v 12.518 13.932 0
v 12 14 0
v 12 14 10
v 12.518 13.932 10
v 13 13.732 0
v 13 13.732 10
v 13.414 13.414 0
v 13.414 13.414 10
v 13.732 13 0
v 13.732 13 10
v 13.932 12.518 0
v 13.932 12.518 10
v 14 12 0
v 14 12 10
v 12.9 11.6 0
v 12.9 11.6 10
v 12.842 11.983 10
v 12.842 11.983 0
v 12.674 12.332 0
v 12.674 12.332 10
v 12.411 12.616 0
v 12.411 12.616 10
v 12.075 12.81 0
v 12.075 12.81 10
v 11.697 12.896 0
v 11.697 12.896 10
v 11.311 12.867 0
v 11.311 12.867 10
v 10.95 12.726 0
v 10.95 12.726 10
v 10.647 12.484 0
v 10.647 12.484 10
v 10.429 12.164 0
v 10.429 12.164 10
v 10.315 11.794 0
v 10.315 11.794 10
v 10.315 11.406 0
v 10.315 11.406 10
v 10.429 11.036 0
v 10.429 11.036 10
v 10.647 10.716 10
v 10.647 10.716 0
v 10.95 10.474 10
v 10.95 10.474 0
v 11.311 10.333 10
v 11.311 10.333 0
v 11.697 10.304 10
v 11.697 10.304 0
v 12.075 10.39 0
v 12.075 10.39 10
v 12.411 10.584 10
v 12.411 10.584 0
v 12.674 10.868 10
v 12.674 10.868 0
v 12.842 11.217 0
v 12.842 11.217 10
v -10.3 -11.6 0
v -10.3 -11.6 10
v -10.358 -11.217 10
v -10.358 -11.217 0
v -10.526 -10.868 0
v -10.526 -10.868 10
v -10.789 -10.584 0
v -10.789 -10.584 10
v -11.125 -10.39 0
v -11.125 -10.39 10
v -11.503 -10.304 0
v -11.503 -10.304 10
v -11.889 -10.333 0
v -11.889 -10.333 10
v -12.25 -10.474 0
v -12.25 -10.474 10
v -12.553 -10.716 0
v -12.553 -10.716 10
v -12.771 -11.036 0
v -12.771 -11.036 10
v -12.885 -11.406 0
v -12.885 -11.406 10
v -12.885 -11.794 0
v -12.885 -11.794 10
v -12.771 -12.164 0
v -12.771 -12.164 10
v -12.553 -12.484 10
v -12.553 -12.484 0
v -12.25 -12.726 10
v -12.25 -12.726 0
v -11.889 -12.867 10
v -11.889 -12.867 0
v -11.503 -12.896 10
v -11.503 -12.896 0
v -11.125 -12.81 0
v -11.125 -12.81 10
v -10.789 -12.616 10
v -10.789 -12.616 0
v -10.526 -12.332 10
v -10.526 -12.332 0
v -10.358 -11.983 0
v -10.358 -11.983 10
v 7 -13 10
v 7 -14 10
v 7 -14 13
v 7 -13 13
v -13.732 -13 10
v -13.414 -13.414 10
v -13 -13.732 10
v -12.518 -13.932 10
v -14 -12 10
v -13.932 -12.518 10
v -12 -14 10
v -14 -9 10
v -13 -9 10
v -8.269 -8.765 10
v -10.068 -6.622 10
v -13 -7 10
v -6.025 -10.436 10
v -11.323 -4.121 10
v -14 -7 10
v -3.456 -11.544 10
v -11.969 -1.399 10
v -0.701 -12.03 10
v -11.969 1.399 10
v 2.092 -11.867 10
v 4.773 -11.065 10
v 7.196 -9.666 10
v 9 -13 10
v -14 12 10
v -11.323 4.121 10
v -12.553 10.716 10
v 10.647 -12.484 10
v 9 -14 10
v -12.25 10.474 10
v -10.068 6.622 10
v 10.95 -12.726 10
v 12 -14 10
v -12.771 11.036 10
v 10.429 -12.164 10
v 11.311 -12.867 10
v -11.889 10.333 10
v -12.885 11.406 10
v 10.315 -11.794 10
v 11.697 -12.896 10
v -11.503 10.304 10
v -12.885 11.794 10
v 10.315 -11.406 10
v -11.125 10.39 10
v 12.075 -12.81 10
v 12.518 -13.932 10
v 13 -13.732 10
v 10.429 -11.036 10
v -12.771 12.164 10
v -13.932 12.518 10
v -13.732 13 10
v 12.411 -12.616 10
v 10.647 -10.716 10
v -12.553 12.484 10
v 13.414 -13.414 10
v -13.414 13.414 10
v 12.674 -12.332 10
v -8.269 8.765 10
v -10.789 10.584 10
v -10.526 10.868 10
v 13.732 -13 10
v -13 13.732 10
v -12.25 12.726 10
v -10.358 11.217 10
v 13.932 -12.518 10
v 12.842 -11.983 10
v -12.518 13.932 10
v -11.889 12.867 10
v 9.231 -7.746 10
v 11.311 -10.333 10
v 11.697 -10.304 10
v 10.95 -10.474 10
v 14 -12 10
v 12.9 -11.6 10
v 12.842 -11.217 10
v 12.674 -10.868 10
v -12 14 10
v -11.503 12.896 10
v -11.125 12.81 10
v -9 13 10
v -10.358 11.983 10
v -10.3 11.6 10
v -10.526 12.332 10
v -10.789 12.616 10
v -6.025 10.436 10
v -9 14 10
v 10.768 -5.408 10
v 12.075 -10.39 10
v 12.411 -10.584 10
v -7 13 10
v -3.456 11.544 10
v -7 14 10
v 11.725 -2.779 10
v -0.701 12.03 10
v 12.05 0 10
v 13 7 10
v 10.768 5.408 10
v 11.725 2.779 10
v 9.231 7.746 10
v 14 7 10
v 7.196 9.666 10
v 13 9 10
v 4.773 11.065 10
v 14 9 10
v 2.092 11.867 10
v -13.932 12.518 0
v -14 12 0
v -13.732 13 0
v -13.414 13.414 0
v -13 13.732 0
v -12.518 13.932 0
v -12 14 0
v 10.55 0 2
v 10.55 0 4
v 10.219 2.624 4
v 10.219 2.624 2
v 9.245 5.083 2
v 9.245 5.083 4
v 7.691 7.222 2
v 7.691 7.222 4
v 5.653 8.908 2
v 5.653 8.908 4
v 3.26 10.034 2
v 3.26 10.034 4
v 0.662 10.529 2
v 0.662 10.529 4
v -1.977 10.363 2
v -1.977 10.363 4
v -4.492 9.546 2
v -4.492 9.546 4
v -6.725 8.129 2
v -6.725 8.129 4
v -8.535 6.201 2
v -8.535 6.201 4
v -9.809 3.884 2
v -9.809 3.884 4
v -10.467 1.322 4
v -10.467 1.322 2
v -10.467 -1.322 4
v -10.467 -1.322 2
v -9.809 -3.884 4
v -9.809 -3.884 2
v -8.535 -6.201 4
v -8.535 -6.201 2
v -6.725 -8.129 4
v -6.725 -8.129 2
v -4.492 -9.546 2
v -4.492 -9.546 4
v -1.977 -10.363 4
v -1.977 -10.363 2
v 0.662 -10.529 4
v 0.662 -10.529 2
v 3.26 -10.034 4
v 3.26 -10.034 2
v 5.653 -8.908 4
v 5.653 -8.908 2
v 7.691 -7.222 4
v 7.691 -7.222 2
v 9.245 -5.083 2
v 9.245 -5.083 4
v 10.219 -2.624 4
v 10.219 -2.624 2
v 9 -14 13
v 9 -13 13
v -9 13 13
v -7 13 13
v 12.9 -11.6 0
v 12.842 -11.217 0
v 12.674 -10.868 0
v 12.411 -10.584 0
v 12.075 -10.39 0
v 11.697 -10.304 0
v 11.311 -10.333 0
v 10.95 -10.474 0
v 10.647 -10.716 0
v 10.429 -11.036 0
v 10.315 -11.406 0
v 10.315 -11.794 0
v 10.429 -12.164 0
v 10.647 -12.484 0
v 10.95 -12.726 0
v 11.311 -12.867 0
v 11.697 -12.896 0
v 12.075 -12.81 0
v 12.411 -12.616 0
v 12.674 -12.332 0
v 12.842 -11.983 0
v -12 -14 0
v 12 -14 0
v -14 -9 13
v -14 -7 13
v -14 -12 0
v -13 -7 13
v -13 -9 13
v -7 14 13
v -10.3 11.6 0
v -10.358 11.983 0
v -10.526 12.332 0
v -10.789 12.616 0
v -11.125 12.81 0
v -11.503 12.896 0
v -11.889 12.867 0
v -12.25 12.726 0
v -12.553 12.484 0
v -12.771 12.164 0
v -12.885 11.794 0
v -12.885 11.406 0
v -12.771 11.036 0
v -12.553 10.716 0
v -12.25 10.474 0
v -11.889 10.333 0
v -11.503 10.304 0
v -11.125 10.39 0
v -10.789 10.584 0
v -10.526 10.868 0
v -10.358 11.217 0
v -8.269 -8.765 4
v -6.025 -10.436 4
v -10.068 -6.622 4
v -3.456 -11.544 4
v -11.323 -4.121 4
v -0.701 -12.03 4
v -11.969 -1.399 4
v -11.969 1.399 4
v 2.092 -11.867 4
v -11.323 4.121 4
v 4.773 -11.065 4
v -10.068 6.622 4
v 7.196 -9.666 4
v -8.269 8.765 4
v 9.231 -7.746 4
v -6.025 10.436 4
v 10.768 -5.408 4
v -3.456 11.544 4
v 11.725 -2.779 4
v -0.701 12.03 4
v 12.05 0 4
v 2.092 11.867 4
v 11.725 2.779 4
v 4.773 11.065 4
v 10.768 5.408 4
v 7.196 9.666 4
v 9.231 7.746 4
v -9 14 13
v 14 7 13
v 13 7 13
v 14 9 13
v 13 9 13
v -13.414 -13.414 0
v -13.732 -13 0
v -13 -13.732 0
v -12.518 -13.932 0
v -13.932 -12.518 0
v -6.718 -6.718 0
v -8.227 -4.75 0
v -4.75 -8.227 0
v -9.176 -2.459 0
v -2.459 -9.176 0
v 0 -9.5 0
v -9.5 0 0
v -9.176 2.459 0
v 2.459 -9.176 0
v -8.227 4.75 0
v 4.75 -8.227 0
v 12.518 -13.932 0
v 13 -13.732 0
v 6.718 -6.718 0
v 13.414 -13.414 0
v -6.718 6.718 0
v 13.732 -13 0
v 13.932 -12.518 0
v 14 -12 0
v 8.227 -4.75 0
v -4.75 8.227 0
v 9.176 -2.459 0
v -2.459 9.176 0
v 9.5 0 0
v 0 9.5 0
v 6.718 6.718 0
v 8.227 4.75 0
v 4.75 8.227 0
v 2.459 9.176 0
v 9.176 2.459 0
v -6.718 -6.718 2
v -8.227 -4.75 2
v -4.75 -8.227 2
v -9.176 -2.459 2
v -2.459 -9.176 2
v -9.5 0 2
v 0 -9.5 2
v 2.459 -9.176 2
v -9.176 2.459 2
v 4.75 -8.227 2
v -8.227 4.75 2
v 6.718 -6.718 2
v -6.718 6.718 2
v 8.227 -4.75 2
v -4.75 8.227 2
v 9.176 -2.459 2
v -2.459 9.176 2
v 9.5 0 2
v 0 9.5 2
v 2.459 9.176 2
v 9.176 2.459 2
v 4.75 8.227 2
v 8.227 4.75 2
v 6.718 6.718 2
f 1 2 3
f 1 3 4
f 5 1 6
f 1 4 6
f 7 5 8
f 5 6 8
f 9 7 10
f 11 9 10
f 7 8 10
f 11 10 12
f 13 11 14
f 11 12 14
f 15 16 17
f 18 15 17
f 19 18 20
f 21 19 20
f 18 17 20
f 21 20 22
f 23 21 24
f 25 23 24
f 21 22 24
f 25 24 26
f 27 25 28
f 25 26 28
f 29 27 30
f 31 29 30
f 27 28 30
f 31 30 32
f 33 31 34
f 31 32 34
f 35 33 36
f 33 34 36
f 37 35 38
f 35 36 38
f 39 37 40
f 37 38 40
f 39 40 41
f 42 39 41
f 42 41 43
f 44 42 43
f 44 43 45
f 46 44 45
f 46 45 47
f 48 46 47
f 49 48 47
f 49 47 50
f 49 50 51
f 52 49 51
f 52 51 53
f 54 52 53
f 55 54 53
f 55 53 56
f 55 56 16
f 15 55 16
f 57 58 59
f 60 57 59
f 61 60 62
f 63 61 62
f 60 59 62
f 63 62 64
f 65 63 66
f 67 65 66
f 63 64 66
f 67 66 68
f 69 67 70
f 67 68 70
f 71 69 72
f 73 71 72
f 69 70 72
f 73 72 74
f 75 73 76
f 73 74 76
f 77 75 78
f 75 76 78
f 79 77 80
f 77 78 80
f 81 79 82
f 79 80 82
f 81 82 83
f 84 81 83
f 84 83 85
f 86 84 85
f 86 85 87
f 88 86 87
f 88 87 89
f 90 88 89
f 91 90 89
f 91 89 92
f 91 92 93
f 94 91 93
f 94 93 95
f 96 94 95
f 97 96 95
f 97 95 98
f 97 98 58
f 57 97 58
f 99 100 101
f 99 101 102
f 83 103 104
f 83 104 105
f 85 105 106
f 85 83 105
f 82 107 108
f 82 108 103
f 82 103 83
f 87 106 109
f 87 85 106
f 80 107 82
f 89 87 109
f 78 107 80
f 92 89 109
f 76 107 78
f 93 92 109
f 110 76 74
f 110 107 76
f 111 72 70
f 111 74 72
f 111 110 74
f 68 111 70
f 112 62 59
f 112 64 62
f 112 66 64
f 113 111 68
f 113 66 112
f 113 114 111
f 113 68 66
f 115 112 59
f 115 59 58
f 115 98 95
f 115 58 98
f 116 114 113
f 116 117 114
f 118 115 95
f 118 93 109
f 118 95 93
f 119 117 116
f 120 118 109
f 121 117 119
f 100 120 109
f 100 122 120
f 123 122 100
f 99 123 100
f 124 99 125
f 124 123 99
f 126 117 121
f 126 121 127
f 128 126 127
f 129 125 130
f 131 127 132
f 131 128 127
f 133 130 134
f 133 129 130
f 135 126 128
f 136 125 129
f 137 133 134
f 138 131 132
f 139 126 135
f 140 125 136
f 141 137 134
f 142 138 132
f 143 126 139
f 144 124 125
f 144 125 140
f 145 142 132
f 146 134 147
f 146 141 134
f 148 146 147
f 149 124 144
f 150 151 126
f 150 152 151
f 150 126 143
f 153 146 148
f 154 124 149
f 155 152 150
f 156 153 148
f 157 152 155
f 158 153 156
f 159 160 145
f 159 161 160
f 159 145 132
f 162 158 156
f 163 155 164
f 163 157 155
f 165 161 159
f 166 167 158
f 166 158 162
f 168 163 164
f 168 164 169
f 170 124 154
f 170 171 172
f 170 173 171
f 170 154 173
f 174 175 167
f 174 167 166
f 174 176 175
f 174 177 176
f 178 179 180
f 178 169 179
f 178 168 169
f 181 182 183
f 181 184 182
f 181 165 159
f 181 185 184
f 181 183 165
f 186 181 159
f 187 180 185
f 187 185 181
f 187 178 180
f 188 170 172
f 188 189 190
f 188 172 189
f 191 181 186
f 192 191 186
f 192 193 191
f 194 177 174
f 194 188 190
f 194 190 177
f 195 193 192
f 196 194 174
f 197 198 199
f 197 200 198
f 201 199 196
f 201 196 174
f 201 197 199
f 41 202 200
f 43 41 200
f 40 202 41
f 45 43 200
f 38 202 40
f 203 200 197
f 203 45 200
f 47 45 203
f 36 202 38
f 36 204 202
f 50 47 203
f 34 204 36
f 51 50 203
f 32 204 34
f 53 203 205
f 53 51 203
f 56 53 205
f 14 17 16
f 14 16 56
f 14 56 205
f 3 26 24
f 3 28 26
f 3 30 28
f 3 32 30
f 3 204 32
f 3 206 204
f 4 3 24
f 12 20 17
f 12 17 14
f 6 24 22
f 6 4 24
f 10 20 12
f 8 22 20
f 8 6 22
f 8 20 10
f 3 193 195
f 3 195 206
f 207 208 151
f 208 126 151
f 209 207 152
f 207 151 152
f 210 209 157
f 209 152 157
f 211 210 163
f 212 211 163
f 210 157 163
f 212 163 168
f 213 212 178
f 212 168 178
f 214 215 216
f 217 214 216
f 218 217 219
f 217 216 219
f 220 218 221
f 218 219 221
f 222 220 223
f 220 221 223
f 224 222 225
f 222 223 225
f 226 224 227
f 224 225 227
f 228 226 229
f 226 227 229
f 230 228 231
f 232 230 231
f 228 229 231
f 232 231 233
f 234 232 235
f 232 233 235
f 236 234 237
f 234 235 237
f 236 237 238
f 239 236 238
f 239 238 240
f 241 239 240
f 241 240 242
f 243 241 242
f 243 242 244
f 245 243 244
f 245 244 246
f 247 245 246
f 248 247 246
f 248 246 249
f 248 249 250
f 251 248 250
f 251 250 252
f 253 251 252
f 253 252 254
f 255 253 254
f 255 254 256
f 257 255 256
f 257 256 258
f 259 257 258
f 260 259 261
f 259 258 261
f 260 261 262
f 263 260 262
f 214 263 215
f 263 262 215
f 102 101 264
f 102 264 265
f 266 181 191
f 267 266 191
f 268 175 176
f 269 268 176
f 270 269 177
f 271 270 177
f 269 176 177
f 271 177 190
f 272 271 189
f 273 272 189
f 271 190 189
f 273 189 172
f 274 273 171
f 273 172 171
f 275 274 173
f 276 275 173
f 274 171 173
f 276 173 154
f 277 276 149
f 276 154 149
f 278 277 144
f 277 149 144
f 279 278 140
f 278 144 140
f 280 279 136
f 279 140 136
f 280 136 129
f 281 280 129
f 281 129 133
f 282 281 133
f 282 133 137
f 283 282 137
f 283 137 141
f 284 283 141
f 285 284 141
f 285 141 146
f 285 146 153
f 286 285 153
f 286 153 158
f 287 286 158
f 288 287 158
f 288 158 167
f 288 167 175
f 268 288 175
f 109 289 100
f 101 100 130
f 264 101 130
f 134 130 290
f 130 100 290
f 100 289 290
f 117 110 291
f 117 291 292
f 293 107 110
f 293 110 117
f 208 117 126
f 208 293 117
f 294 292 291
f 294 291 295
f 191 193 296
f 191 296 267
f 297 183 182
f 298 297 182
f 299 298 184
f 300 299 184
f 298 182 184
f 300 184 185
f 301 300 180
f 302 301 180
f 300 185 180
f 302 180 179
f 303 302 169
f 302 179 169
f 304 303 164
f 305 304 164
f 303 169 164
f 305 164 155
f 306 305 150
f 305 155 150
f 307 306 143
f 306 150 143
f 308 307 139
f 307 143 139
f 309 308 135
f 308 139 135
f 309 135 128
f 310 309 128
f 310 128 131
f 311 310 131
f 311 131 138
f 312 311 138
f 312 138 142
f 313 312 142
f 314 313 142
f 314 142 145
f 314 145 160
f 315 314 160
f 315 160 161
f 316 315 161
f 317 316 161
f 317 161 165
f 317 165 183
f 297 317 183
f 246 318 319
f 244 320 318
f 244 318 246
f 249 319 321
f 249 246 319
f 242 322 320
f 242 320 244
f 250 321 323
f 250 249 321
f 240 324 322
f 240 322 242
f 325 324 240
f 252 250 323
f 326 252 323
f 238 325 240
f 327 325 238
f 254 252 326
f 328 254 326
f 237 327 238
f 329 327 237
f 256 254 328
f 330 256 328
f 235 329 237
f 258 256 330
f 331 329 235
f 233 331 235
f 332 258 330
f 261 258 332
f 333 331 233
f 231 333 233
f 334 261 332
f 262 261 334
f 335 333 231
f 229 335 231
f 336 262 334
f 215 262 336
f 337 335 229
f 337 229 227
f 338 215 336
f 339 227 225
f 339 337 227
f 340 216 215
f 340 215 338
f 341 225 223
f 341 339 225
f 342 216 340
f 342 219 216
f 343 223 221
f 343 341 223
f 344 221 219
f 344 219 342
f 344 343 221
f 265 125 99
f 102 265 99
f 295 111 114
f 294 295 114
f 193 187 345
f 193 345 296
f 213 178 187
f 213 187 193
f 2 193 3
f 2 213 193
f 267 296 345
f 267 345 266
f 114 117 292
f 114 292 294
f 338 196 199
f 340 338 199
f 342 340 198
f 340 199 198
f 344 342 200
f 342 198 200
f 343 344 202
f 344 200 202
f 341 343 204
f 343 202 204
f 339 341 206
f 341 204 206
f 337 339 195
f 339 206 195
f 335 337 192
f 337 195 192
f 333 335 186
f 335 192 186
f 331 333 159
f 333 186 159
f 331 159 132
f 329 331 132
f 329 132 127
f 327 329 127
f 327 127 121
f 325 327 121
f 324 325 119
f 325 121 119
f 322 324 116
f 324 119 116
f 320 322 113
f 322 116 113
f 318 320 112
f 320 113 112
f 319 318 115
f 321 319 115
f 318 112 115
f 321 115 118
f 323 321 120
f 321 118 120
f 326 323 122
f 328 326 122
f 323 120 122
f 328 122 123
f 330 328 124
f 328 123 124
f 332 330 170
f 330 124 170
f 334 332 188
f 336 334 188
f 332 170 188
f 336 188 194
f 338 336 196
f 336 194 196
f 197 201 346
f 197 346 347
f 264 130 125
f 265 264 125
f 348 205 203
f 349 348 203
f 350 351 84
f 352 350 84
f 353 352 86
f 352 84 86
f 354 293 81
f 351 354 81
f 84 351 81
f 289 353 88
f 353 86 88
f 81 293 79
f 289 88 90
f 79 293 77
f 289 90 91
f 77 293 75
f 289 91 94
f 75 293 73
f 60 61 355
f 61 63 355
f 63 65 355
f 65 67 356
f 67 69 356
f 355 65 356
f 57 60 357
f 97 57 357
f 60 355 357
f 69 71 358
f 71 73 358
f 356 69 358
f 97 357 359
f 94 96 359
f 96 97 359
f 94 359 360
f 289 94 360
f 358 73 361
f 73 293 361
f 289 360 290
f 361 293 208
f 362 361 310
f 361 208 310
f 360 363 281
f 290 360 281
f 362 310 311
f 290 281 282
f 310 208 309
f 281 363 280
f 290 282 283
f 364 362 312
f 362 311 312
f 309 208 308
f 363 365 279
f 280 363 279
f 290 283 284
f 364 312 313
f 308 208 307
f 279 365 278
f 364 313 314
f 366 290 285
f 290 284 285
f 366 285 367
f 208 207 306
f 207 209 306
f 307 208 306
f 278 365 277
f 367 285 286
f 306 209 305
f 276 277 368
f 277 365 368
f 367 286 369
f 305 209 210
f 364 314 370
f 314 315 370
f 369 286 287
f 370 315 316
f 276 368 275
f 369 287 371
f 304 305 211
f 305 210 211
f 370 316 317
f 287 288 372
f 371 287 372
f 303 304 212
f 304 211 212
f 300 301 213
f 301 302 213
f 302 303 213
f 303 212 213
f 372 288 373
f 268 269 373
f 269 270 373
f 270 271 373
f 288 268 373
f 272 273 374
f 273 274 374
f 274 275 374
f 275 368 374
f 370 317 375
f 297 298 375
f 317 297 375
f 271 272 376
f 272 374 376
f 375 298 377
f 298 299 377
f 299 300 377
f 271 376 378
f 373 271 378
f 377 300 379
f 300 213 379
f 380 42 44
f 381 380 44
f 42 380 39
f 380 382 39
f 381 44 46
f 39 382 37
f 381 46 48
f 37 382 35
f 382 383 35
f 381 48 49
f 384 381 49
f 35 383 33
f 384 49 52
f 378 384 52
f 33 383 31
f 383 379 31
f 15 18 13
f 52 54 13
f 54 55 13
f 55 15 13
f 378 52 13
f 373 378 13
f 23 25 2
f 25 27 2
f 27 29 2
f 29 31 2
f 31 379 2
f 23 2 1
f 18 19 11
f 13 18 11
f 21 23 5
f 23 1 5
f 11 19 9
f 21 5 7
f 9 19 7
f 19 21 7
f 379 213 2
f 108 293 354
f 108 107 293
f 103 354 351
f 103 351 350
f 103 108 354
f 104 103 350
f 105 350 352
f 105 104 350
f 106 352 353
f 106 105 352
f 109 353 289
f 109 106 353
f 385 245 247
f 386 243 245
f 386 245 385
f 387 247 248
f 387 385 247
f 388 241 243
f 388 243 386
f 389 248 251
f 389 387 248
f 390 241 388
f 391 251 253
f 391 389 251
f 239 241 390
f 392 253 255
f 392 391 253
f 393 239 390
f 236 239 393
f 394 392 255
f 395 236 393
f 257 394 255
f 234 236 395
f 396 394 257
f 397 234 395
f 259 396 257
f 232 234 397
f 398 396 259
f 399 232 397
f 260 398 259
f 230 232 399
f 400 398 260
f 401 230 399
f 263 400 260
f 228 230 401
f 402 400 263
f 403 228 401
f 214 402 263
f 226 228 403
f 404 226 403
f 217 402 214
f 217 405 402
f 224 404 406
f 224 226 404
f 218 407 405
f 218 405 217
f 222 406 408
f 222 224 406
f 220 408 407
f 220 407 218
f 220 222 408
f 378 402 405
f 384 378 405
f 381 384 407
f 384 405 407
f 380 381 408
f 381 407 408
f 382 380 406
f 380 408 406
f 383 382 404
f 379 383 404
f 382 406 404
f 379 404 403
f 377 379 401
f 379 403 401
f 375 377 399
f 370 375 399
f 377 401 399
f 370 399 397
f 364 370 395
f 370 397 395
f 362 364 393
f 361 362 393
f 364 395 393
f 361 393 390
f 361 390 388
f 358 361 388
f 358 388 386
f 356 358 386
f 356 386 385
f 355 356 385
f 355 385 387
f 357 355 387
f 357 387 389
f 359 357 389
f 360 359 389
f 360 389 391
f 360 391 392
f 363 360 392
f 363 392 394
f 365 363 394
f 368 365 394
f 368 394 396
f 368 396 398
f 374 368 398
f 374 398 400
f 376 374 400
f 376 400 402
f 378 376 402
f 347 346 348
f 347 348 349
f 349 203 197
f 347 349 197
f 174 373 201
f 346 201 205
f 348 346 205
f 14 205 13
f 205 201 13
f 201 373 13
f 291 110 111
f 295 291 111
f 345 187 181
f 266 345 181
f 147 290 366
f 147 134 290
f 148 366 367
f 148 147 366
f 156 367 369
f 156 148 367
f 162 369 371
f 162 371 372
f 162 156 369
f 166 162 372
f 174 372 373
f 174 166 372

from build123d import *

# Parameters (mm, degrees)
SKETCH_1_W               = 28
SKETCH_1_H               = 28
EXTRUDE_1_DEPTH          = 10
SKETCH_2_R               = 9.5
CUT_EXTRUDE_1_DEPTH      = 11
SKETCH_3_R               = 10.55
CUT_EXTRUDE_2_DEPTH      = 8
SKETCH_4_R               = 12.05
CUT_EXTRUDE_3_DEPTH      = 6
FILLET_1_R               = 2
SKETCH_5_R               = 1.3
CUT_EXTRUDE_4_DEPTH      = 11
SKETCH_6_W               = 1
SKETCH_6_H               = 2
EXTRUDE_2_DEPTH          = 3
PATTERN_CIRCULAR_1_COUNT = 4


with BuildPart() as part:
    # 草图1 → 凸台-拉伸1 (new body)
    with BuildSketch(Plane.XY):
        Rectangle(SKETCH_1_W, SKETCH_1_H)
    extrude(amount=EXTRUDE_1_DEPTH)

    # 草图2 → 切除-拉伸1 (cut, through all)
    with BuildSketch(Plane.XY.offset(10)):
        Circle(SKETCH_2_R)
    extrude(amount=-CUT_EXTRUDE_1_DEPTH, mode=Mode.SUBTRACT)

    # 草图3 → 切除-拉伸2 (cut)
    with BuildSketch(Plane.XY.offset(10)):
        Circle(SKETCH_3_R)
    extrude(amount=-CUT_EXTRUDE_2_DEPTH, mode=Mode.SUBTRACT)

    # 草图4 → 切除-拉伸3 (cut)
    with BuildSketch(Plane.XY.offset(10)):
        Circle(SKETCH_4_R)
    extrude(amount=-CUT_EXTRUDE_3_DEPTH, mode=Mode.SUBTRACT)

    # 圆角1
    fillet_1_edges = [part.edges().sort_by_distance(p)[0] for p in [
        (14, -14, 5),
        (-14, -14, 5),
        (-14, 14, 5),
        (14, 14, 5),
    ]]
    fillet(fillet_1_edges, radius=FILLET_1_R)

    # 草图5 → 切除-拉伸4 (cut, through all)
    with BuildSketch(Plane.XY.offset(10)):
        with Locations((-11.6, 11.6)):
            Circle(SKETCH_5_R)
        with Locations((11.6, 11.6)):
            Circle(SKETCH_5_R)
        with Locations((11.6, -11.6)):
            Circle(SKETCH_5_R)
        with Locations((-11.6, -11.6)):
            Circle(SKETCH_5_R)
    extrude(amount=-CUT_EXTRUDE_4_DEPTH, mode=Mode.SUBTRACT)

    # 草图6 → 凸台-拉伸2 (add)
    with BuildSketch(Plane.XY.offset(10)):
        with Locations((-13.5, -8)):
            Rectangle(SKETCH_6_W, SKETCH_6_H)
    extrude_2 = extrude(amount=EXTRUDE_2_DEPTH)

    # 阵列(圆周)1: 凸台-拉伸2 ×4 about axis
    pattern_circular_1_axis = Axis((0, 0, 0), (0, 0, 1))
    for i in range(1, PATTERN_CIRCULAR_1_COUNT):
        add(extrude_2.rotate(pattern_circular_1_axis, i * 360 / PATTERN_CIRCULAR_1_COUNT))


solid = part.part
